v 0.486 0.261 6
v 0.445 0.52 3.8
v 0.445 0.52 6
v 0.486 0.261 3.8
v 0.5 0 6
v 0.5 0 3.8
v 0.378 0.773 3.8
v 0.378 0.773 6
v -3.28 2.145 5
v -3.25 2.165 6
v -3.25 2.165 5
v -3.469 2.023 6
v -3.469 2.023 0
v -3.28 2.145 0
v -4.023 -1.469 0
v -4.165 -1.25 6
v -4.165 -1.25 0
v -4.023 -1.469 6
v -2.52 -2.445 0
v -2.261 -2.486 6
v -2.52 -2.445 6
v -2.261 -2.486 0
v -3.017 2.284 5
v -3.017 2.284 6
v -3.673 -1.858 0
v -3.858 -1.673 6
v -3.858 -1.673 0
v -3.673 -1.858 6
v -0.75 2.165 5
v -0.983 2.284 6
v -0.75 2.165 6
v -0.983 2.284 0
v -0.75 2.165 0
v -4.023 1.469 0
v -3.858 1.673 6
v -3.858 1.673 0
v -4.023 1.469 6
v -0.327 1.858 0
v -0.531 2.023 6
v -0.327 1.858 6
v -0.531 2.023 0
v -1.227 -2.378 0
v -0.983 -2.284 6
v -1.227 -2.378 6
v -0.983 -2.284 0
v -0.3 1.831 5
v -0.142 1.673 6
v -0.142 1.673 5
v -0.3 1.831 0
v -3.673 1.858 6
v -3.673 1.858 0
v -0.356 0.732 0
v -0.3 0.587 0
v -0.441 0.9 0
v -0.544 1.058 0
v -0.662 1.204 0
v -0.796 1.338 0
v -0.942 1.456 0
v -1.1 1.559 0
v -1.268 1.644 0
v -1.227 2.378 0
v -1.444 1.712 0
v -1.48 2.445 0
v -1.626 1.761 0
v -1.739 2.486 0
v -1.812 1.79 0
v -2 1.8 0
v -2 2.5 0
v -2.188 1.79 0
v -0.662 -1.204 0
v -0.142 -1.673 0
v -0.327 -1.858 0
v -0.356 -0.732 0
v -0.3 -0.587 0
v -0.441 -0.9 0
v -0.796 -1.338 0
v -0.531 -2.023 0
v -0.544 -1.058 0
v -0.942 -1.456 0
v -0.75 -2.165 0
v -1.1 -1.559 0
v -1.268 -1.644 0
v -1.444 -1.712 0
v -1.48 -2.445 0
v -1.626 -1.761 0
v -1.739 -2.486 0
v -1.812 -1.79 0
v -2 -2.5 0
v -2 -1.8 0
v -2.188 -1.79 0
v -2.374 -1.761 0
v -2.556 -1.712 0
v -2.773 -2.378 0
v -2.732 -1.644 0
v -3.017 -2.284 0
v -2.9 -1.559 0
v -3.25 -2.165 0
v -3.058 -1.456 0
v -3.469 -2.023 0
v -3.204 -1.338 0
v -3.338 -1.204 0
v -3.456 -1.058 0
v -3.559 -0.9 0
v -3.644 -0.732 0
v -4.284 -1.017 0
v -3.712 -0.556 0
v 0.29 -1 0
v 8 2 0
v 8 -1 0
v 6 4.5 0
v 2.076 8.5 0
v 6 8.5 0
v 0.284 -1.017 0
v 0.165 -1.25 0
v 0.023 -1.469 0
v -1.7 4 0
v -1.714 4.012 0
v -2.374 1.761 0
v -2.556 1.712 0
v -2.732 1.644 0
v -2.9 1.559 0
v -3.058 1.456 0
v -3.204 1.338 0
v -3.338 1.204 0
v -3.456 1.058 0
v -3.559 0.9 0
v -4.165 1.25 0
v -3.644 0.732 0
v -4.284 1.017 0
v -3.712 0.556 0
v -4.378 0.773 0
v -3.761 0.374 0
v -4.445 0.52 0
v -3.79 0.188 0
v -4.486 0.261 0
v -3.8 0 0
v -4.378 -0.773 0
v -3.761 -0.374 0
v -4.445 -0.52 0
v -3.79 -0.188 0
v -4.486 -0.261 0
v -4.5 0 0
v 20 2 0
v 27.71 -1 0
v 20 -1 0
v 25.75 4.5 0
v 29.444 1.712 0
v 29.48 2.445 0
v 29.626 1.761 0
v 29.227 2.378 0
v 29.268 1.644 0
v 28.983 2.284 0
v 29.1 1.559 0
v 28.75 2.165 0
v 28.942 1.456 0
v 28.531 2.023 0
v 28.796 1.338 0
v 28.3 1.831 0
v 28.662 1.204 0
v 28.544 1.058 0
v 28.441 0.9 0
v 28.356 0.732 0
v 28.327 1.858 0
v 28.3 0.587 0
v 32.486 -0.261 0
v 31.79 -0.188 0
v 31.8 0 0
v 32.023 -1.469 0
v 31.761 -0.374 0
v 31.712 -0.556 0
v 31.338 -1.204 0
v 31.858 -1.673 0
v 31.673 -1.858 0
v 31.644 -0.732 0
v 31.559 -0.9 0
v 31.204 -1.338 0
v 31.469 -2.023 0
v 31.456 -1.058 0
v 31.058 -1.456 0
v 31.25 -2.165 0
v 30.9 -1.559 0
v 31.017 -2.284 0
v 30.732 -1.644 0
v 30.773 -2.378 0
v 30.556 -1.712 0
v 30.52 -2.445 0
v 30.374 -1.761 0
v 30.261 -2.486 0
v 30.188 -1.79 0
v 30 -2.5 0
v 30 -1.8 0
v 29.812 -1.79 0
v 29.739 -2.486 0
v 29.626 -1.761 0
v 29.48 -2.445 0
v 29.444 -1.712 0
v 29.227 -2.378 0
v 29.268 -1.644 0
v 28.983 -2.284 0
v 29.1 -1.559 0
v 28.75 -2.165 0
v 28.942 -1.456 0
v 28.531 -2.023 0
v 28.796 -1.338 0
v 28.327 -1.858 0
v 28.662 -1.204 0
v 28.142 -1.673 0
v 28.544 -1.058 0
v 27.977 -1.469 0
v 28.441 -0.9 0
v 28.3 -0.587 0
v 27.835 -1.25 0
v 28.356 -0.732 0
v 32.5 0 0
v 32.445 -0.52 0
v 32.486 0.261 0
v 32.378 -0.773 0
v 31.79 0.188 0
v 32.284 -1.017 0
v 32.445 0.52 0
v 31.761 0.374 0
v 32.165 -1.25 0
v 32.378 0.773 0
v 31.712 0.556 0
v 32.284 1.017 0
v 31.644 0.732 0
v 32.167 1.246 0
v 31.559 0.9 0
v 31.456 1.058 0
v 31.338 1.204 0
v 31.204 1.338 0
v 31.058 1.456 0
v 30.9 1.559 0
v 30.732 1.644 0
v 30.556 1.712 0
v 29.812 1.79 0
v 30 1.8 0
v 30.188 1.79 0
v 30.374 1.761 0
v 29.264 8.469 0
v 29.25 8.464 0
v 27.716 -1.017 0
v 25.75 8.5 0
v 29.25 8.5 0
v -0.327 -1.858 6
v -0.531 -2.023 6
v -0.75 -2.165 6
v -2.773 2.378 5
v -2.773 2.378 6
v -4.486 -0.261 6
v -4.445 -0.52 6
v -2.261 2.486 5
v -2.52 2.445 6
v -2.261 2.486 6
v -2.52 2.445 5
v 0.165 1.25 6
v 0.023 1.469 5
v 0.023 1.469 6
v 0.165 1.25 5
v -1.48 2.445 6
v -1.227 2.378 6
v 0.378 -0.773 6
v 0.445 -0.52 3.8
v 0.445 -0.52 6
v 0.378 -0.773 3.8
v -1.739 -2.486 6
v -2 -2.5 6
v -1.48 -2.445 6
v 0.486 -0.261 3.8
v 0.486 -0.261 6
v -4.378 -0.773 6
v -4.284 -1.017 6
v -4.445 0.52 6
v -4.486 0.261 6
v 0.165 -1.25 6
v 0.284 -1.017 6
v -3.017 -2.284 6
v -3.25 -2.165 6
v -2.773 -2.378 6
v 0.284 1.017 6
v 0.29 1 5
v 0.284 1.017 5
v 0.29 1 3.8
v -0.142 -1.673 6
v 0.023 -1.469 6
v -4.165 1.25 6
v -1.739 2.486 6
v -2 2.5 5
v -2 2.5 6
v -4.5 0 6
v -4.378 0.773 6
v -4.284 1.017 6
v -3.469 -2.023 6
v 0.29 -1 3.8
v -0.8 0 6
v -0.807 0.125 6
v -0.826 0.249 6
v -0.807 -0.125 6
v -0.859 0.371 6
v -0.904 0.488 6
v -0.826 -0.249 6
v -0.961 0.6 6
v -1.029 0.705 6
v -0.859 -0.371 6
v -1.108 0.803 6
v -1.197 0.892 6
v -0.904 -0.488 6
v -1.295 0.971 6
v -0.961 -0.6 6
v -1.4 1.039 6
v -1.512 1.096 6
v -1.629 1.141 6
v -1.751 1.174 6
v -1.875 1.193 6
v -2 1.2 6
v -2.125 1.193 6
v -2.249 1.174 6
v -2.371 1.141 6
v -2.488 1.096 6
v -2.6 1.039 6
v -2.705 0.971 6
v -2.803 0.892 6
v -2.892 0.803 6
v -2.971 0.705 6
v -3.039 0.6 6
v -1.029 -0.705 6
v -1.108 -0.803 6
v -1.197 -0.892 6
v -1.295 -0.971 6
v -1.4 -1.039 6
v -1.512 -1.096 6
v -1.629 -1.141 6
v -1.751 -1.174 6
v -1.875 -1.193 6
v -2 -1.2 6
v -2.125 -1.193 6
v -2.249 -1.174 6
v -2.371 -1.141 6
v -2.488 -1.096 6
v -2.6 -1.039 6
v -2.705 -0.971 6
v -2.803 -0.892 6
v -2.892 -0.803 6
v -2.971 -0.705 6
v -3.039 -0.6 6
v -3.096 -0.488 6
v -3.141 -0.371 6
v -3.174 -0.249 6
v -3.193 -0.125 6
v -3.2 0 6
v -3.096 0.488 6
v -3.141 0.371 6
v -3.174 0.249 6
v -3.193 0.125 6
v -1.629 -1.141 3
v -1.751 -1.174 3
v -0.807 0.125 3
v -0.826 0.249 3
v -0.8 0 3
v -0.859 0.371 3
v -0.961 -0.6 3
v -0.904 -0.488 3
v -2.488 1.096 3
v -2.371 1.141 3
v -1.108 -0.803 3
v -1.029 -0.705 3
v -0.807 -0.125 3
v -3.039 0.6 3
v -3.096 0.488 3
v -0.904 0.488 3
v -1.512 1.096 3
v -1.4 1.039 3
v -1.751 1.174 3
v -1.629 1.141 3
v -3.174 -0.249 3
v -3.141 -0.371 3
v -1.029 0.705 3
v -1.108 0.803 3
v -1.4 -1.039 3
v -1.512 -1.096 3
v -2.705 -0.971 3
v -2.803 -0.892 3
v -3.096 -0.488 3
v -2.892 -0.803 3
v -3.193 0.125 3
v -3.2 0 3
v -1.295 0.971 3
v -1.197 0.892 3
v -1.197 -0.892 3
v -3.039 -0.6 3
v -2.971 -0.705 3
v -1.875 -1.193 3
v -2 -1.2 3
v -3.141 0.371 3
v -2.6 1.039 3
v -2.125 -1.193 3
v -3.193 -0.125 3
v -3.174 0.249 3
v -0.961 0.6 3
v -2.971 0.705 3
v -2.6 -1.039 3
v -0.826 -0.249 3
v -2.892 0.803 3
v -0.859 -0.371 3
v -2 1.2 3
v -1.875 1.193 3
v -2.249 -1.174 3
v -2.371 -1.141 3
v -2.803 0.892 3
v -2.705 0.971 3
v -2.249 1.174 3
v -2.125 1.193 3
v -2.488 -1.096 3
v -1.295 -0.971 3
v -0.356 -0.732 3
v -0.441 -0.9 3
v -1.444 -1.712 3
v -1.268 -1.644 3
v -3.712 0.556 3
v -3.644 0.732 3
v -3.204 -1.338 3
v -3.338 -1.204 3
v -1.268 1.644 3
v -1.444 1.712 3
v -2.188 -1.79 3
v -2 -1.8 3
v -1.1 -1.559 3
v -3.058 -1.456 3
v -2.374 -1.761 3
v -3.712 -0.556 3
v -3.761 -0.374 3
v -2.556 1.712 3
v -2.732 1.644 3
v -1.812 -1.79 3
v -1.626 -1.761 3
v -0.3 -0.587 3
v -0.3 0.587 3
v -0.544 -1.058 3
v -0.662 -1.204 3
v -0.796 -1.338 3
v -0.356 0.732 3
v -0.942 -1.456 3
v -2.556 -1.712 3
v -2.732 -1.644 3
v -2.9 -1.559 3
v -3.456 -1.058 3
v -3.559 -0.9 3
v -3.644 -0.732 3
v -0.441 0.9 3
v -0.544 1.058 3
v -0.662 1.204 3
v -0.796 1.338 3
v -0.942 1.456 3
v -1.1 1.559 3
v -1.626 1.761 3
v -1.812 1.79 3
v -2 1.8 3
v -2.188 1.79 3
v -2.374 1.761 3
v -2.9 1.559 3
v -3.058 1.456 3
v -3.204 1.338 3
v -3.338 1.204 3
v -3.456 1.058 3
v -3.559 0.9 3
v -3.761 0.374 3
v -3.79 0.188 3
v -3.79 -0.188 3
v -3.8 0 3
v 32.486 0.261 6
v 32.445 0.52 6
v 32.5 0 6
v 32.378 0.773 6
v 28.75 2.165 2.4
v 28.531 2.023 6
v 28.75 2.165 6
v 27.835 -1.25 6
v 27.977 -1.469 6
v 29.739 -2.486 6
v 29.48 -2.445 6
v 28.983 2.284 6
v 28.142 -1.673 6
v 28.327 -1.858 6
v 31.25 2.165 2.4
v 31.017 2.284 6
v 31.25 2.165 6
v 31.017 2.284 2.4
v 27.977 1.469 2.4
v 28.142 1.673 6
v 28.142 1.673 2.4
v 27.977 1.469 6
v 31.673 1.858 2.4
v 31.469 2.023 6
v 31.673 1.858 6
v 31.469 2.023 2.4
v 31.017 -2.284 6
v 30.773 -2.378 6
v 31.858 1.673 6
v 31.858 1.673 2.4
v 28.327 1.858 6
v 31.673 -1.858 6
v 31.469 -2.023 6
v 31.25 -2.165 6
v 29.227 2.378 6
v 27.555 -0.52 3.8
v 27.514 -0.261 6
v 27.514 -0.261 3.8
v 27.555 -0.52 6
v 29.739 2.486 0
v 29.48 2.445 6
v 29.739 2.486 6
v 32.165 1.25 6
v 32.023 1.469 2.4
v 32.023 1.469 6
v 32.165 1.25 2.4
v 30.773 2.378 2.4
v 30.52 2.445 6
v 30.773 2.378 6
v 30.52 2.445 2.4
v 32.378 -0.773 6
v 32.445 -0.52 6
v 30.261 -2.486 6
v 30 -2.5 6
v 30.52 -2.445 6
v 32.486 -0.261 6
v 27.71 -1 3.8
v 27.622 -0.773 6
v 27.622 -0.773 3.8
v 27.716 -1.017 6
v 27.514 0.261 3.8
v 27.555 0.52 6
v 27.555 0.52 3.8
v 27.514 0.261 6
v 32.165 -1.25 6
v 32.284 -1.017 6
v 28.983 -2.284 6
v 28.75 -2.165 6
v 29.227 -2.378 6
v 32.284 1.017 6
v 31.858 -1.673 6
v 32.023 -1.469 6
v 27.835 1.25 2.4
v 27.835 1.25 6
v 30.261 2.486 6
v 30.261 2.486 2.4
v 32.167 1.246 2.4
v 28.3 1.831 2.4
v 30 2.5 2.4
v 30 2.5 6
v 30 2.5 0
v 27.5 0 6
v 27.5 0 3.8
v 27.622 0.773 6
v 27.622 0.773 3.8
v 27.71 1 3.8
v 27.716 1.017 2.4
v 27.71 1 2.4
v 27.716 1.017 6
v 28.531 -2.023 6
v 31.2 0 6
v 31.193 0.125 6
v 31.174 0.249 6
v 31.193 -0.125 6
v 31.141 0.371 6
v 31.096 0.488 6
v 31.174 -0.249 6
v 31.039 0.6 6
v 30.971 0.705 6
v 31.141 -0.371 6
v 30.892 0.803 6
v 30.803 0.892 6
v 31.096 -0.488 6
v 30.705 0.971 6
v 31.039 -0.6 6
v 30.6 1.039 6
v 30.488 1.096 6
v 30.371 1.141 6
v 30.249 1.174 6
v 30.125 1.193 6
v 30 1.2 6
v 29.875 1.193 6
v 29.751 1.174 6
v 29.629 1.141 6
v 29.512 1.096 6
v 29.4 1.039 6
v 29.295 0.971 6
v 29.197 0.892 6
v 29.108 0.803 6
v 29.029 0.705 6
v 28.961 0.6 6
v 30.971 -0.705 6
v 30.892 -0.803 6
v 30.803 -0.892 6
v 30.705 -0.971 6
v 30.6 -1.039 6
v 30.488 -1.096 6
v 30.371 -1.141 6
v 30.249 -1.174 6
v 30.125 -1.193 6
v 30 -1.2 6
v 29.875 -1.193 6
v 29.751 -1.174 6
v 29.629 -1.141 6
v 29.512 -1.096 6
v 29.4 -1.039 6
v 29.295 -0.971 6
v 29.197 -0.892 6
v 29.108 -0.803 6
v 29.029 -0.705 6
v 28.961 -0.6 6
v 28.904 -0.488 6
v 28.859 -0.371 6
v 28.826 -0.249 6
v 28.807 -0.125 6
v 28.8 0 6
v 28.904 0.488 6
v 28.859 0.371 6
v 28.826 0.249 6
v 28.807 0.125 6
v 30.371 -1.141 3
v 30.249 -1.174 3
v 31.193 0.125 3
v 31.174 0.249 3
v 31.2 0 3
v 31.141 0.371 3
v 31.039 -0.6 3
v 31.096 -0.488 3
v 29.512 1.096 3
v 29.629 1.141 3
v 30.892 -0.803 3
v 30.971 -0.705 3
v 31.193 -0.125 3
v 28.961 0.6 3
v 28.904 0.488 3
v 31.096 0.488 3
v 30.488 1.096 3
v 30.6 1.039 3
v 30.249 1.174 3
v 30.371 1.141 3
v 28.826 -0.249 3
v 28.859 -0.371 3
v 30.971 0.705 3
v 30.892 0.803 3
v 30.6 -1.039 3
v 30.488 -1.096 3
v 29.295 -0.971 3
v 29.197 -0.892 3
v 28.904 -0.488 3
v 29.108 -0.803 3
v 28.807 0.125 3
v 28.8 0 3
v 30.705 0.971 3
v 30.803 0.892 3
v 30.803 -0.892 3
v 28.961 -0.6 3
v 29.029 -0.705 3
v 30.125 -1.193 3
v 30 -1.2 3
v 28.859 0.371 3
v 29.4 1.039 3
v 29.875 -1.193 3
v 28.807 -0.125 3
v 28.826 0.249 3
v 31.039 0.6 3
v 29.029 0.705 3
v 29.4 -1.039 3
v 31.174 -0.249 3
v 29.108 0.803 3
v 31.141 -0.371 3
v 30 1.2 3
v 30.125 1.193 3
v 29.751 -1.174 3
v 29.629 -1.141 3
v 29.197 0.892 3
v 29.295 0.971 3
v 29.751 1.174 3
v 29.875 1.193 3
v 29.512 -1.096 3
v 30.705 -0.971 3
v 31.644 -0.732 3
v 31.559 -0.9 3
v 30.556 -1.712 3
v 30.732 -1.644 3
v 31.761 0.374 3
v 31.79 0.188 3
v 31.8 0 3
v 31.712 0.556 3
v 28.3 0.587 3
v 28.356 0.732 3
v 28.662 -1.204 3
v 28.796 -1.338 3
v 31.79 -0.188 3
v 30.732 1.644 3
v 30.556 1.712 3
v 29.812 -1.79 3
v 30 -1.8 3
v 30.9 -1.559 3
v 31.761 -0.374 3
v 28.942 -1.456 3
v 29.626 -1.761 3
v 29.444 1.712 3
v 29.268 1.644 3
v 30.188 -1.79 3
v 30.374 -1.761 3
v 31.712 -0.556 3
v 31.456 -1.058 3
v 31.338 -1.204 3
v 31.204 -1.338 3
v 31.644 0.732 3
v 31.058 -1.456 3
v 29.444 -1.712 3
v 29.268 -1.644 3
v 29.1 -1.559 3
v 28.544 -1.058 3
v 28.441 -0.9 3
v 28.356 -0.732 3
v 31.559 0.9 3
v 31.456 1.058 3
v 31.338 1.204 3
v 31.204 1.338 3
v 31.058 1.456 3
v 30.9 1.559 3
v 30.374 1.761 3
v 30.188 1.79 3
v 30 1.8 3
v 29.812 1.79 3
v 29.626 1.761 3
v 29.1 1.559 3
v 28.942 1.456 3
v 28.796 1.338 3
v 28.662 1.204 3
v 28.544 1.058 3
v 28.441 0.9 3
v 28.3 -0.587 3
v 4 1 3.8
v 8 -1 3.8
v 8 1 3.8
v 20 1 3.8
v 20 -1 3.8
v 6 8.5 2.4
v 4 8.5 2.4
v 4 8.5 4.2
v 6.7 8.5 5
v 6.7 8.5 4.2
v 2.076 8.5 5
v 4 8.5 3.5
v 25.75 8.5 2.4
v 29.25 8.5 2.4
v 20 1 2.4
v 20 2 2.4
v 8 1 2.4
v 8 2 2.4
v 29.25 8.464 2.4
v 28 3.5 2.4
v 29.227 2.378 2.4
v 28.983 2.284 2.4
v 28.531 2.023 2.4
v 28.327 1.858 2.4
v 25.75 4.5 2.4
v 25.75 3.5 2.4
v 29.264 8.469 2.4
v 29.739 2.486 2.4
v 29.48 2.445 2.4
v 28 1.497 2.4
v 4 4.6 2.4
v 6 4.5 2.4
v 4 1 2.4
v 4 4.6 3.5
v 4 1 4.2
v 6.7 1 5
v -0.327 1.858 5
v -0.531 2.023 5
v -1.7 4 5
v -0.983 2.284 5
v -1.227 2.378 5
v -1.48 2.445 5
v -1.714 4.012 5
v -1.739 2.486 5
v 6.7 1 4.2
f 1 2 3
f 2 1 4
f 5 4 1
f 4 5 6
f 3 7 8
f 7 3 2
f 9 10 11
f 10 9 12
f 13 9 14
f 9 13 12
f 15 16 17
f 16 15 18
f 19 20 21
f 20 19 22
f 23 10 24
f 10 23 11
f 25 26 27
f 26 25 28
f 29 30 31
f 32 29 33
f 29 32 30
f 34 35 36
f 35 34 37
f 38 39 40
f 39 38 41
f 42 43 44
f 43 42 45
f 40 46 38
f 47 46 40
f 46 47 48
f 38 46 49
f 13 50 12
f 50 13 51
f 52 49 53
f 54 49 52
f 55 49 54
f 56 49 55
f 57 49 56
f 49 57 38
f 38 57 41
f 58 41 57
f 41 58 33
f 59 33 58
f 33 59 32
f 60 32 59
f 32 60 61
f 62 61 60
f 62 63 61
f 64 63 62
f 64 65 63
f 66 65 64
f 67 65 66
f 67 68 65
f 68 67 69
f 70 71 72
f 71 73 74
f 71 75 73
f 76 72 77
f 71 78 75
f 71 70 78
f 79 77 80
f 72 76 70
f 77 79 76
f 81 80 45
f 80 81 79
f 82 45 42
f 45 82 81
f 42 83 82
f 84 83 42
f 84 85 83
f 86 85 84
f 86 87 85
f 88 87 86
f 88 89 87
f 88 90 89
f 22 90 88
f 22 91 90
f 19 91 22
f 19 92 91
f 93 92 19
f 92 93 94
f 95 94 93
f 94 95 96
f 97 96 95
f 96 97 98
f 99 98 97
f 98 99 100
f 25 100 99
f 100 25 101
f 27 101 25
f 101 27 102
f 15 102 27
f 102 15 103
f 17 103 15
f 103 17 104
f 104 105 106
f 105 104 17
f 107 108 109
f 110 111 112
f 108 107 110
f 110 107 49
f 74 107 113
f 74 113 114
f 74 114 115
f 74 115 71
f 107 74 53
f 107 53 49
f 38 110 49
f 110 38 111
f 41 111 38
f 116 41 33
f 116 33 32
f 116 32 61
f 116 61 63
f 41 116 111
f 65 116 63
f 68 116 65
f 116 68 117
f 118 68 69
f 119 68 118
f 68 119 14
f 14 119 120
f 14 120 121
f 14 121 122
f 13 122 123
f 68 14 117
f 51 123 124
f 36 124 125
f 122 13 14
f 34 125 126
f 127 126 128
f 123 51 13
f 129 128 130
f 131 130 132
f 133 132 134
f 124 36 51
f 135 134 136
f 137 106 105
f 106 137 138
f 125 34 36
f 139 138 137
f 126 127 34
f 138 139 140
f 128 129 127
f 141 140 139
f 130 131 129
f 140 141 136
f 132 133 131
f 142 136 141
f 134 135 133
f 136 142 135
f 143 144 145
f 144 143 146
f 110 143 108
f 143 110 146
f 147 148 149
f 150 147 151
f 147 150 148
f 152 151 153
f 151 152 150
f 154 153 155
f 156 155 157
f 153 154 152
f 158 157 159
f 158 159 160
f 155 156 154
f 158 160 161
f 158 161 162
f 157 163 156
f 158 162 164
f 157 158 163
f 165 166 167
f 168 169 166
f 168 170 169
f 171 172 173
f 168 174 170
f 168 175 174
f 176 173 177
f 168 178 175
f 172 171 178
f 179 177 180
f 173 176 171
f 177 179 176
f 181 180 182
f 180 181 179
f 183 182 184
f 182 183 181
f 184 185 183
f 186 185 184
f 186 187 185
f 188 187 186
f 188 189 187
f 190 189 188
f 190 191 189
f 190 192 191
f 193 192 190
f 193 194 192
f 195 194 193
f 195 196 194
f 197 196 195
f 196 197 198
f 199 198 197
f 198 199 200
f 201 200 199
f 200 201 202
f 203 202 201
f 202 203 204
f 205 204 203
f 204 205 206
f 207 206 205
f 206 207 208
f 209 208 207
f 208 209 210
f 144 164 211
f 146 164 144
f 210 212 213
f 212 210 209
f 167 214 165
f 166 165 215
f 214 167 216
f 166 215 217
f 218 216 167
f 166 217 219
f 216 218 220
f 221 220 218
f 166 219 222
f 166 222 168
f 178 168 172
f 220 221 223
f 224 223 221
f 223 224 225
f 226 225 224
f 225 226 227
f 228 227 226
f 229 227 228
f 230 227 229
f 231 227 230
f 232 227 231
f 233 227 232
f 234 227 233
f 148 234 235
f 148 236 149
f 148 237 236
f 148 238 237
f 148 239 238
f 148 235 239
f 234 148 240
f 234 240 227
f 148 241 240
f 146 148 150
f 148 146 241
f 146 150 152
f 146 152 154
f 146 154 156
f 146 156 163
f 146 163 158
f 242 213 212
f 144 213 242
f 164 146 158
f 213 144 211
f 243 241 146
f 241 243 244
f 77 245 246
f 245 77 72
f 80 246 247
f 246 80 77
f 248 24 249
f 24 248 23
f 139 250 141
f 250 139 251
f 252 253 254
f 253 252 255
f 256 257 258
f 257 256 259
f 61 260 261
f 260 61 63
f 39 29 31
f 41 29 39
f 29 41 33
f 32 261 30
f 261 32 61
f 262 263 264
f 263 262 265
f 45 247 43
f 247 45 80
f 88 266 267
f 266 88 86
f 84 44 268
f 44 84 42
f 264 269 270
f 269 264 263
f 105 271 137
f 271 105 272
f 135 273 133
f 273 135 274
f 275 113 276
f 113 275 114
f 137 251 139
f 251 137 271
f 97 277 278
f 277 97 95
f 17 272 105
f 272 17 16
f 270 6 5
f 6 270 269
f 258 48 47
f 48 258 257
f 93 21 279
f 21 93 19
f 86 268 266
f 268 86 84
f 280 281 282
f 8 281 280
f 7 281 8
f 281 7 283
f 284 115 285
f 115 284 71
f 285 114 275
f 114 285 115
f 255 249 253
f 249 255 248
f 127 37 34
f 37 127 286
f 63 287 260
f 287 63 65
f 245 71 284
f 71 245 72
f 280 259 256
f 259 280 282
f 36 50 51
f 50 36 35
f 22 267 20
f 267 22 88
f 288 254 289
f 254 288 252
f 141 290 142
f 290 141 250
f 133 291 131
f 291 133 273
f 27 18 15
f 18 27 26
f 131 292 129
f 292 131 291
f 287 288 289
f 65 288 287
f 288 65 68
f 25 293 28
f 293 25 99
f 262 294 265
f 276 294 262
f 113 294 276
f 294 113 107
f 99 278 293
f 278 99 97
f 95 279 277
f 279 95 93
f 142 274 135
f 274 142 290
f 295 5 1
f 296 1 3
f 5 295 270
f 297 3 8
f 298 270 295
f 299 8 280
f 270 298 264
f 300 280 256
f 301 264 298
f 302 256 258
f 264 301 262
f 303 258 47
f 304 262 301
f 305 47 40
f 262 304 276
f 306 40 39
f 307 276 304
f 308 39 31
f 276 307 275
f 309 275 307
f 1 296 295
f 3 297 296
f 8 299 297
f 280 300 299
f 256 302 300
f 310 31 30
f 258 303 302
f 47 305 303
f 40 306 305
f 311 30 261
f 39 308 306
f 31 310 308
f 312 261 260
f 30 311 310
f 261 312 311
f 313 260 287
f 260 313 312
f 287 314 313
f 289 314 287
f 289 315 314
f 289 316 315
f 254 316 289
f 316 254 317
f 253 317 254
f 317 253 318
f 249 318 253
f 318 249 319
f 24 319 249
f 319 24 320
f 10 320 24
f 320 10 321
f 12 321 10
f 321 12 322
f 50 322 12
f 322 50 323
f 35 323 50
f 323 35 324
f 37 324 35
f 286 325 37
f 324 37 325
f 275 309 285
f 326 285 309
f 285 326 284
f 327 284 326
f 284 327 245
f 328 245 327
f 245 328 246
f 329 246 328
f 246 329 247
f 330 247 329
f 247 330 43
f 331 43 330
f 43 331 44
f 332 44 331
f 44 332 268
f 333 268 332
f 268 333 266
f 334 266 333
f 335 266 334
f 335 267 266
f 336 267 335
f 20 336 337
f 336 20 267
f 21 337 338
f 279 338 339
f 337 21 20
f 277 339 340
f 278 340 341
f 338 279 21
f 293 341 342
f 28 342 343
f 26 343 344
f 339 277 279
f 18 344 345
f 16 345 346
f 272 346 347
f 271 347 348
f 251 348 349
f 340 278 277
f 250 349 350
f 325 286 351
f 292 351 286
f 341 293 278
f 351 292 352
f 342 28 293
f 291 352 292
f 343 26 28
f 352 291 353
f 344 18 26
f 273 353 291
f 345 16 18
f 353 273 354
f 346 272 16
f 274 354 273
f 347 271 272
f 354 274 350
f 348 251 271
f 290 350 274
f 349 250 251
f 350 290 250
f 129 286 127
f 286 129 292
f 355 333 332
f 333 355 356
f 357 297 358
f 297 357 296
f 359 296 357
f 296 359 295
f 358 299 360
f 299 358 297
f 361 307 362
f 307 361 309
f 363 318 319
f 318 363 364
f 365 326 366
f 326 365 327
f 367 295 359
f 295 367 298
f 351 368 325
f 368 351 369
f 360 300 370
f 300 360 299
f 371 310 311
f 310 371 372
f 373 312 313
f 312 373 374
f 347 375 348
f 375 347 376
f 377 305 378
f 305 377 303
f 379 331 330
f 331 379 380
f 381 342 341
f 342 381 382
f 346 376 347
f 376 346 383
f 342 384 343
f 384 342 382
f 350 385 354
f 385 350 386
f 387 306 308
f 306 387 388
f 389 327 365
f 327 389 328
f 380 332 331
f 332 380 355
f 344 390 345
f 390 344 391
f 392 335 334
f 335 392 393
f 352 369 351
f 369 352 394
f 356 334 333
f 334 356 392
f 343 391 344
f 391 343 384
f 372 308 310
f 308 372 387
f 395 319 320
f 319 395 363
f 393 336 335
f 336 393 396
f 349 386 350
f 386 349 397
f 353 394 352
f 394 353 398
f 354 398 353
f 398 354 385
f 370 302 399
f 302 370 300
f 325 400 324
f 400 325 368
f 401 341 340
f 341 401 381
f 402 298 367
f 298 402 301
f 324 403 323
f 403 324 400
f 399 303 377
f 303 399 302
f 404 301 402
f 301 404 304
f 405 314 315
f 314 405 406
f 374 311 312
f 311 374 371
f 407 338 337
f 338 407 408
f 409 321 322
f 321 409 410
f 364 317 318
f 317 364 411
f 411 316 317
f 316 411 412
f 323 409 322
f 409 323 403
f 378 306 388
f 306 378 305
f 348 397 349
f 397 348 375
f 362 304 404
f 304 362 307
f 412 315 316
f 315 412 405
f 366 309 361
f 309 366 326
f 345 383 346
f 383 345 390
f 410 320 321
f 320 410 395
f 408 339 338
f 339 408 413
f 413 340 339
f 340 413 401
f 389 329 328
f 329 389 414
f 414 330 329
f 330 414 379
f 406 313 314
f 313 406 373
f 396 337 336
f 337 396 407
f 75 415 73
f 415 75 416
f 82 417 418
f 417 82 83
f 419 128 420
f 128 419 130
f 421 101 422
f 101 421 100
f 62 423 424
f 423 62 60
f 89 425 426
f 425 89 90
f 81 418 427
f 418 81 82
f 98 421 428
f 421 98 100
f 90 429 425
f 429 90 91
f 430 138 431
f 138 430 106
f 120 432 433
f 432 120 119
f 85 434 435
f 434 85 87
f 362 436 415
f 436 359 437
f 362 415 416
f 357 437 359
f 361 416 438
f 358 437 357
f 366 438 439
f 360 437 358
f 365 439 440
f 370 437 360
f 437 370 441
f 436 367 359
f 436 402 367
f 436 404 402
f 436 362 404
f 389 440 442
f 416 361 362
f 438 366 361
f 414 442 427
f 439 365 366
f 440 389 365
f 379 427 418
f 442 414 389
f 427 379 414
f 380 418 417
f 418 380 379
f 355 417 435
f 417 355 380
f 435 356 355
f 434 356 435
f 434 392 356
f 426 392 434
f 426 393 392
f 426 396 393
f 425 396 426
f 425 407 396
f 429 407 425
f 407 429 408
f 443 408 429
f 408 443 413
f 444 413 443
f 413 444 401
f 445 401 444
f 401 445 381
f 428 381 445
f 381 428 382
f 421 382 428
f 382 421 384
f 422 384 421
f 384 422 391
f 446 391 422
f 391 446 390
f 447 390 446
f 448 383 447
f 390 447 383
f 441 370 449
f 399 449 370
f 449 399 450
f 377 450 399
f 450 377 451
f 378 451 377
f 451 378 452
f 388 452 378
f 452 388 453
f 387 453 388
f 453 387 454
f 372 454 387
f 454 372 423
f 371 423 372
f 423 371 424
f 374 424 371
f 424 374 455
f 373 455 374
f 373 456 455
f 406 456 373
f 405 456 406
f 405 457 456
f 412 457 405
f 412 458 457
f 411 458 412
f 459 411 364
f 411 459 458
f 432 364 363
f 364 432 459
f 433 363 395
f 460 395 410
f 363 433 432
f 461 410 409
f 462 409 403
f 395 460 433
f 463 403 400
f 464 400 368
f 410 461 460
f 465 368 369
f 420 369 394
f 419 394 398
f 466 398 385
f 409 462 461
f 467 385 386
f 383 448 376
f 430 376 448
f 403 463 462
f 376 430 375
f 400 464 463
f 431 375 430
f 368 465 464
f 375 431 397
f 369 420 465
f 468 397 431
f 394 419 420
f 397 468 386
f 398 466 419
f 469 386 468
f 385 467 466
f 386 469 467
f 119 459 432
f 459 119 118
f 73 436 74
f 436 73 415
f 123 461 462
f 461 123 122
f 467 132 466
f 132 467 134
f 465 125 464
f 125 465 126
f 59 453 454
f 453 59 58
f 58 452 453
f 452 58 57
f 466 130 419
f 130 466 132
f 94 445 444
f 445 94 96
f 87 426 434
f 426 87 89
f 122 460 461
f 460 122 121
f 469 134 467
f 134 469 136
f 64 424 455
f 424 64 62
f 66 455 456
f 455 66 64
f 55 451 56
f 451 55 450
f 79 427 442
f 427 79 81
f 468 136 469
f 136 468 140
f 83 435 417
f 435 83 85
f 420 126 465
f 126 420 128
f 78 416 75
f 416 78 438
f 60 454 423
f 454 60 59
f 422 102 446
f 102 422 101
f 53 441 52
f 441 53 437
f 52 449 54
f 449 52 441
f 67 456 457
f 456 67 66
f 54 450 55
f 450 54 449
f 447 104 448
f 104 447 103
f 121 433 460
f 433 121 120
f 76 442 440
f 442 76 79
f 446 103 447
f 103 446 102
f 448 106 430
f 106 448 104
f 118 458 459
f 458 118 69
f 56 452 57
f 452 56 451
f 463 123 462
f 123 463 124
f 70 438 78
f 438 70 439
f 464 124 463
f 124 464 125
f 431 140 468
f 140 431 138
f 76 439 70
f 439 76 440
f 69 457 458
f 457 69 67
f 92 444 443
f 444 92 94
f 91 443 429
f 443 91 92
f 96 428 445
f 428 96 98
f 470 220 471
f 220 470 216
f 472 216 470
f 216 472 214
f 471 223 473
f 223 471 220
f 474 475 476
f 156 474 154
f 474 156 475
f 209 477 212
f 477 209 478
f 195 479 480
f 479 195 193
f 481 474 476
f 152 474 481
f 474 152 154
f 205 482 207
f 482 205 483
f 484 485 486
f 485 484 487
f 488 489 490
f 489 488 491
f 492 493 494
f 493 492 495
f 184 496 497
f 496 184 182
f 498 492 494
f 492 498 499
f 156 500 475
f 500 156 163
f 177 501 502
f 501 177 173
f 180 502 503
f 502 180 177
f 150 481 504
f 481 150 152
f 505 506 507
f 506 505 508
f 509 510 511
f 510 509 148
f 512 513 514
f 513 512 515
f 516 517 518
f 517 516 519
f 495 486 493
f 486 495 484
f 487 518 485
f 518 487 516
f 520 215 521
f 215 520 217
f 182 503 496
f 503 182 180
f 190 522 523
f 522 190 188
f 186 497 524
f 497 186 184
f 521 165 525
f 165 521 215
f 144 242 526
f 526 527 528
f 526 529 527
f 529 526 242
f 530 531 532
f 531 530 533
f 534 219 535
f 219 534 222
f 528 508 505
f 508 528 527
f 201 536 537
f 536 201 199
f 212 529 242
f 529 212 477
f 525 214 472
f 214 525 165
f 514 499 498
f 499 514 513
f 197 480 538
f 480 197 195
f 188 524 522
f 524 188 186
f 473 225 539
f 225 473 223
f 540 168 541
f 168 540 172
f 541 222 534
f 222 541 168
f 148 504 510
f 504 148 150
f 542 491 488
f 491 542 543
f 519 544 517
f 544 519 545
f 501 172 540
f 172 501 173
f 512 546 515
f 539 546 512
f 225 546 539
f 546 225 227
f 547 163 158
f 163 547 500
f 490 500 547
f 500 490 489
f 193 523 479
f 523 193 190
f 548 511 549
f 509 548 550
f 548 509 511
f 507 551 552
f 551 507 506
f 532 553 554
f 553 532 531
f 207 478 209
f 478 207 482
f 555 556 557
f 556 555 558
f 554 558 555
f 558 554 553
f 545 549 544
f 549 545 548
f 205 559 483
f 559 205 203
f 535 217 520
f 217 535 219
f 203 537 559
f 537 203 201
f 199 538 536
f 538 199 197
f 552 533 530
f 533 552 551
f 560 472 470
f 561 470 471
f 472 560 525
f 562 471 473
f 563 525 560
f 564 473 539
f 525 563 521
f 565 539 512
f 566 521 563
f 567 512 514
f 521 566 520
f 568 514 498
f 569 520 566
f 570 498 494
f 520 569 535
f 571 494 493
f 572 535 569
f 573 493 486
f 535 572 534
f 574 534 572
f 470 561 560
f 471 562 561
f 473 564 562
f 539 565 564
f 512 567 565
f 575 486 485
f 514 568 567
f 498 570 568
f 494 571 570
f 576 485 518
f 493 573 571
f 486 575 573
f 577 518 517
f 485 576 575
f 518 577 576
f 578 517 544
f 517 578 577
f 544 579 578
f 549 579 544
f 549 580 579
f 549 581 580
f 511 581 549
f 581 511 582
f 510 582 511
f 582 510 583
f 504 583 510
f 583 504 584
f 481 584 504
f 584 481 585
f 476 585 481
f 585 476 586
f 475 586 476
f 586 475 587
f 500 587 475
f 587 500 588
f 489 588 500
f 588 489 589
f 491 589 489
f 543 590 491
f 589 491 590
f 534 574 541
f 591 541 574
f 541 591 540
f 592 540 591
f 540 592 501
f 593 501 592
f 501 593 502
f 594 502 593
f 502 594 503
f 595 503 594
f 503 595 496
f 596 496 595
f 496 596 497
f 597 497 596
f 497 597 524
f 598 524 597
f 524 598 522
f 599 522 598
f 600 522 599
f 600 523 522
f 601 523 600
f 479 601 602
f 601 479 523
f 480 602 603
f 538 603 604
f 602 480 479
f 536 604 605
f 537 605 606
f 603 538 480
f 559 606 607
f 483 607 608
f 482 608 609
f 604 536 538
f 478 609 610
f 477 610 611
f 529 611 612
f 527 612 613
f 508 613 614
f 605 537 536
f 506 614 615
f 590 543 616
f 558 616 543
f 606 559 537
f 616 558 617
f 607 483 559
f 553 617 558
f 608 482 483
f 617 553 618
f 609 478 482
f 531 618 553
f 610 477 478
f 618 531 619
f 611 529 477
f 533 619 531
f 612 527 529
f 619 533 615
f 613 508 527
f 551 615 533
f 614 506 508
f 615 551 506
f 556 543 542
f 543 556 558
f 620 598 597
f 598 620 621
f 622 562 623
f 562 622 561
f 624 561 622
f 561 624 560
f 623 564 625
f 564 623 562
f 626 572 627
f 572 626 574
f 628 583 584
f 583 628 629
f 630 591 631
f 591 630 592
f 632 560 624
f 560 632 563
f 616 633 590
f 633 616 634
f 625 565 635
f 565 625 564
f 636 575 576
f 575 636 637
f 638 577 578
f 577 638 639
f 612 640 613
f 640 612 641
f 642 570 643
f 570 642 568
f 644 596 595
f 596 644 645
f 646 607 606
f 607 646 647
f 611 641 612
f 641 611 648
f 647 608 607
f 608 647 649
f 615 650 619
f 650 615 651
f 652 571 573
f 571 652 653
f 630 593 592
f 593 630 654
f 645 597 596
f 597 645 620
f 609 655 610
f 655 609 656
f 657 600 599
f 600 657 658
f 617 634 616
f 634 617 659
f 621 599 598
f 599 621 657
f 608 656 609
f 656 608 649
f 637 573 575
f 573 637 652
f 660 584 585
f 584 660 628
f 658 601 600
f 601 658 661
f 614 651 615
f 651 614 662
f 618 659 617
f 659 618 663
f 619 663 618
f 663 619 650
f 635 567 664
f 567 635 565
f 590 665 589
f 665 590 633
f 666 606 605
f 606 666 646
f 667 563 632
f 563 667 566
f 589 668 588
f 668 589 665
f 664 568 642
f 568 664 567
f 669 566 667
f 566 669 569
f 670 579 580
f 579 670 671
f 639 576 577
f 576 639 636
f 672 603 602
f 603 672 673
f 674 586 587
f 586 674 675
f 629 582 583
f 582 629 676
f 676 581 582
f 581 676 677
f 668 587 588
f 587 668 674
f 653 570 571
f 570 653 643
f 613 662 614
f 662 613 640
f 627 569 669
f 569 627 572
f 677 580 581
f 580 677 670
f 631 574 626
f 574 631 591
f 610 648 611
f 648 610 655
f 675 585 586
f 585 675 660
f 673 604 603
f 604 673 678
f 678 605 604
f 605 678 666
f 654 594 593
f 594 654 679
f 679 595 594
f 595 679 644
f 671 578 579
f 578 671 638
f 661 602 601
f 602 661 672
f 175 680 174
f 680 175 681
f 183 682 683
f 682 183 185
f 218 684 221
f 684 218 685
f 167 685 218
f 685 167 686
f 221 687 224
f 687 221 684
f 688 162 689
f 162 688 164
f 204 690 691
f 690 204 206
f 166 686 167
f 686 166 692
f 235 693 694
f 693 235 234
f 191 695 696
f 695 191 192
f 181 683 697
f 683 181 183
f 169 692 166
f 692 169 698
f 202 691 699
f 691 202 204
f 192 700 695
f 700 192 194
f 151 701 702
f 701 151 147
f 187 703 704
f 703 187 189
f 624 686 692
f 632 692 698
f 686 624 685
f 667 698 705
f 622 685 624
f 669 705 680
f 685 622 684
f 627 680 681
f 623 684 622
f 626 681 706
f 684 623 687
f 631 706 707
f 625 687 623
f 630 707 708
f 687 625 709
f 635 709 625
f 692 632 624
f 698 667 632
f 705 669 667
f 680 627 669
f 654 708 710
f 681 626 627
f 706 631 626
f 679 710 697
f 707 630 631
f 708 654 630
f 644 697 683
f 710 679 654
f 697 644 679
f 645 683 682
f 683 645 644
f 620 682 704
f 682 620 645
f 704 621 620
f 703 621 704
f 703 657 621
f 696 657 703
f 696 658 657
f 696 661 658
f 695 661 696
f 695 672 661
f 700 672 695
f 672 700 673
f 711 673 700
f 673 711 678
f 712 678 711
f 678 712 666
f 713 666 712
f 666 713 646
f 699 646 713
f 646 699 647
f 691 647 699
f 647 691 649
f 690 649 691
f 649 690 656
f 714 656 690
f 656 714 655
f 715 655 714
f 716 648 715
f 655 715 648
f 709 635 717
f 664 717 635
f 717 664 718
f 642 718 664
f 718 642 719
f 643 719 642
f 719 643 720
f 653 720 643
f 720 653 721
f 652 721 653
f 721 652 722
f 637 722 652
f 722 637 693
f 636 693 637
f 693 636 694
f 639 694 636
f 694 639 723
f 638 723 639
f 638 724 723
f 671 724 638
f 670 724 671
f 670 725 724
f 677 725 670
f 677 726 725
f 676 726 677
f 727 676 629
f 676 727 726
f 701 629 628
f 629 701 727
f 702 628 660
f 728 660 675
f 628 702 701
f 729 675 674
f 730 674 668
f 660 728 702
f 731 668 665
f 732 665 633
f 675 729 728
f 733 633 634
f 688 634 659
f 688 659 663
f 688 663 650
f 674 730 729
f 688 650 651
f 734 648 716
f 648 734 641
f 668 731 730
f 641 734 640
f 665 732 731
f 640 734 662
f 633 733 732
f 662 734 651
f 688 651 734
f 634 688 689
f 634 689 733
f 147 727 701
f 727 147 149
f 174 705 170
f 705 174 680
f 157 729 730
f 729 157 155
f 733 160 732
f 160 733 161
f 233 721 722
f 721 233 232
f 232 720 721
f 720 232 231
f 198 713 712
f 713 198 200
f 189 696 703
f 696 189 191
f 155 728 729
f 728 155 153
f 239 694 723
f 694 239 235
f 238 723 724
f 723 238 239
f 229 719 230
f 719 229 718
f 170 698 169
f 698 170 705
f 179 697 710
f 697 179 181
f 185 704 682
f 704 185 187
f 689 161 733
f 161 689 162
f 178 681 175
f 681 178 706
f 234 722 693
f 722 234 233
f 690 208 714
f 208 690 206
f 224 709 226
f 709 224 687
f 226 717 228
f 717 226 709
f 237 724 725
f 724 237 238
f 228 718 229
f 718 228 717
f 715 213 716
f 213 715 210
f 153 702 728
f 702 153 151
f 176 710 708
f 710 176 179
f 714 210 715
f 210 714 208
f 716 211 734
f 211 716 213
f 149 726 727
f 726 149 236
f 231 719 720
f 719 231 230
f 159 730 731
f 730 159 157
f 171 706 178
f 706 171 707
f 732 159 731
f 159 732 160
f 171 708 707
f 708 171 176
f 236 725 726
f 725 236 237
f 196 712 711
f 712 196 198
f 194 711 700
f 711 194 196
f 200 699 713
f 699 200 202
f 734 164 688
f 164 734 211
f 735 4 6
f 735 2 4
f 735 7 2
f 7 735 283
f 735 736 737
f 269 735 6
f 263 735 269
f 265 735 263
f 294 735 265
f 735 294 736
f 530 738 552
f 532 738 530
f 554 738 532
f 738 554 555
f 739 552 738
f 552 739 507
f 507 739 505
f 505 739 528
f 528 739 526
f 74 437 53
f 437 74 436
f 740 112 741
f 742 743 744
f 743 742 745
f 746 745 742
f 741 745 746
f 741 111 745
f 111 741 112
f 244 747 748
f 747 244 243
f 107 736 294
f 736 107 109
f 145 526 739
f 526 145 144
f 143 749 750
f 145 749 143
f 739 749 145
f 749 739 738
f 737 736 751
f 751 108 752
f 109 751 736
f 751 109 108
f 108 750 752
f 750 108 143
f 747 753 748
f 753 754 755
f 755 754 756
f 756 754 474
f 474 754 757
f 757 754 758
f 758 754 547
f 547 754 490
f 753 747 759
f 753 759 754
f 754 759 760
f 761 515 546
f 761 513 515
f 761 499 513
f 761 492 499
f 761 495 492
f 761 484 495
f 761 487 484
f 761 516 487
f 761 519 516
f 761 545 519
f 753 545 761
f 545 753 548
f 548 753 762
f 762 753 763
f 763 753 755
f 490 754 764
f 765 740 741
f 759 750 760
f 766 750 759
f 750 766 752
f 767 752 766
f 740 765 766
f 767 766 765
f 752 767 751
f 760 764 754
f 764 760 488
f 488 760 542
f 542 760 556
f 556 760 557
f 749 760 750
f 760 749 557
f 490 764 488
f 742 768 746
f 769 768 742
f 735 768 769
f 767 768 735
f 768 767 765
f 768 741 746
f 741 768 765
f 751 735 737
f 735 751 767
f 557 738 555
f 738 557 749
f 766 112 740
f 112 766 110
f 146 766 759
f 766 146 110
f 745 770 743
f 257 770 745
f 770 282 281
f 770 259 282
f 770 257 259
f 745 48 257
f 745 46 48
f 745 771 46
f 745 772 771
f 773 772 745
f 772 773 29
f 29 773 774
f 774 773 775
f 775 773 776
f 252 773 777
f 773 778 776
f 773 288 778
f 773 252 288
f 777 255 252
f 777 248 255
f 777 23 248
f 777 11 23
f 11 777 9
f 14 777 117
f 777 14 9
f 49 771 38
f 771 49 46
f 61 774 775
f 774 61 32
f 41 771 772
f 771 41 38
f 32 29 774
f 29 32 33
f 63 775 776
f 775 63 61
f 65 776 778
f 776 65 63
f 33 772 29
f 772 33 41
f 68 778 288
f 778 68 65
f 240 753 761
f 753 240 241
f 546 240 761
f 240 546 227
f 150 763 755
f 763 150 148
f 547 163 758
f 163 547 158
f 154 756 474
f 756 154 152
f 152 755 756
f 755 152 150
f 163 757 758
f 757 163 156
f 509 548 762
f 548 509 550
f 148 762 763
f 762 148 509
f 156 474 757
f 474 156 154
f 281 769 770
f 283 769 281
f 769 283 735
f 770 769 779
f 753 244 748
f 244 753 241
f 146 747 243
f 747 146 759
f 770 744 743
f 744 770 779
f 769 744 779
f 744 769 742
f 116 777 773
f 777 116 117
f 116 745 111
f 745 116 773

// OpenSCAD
$fn = 60;

interface_handle = true;

// 31mm

difference() {
    mount();
    translate([-1.7, 4, -2]) rotate([0, 0, 50]) cube([14, 10, 10]);
}

//#translate([0, 8.5, -5]) cube([100, 1, 20]);

module mount() {

    translate([-2, 0, 0]) mountHole();
    
    translate([28 + 2, 0, 0]) mountHole();
    
    difference() {
        translate([-0.3, -1, 0]) cube([28 + 0.6, interface_handle ? 9.5 : 6.6, 3.8]);
        translate([8, -2, -0.1]) cube([12, 4, 4]);
        translate([4, 1, 2.4]) cube([25, interface_handle ? 9 : 4, 2]);
        if (!interface_handle) {
            translate([4, 1, 2]) rotate([-25, 0, 0]) cube([25, 4, 2]);
        } else {
            translate([6, 4.5, -0.5]) cube([21.5, 5, 4]);
        }
    }
    
    // left mount of interface
    translate([-0.3, 1, 1.5]) cube([4.3, 3.6, 3.5]);
    translate([25.75, 3.5, 0]) cube([3.5, 5, 2.4]);
    
    // right mount of the interface
    translate([-0.3, 1, 4.2]) cube([7, 7.5, 0.8]);
    translate([-0.3, 4, 3.5]) cube([4.3, 4.5, 1]);
    
    // Edges
    difference() {
        translate([-1.5, -0.4, 0]) rotate([0, 0, 50]) cube([6.2, 3, 5]);
        translate([-2, 0, -0.5]) cylinder(d = 5, h = 6);
    }
    difference() {
        translate([28, 0, 0]) {
            translate([-2, 2.4, 0]) rotate([0, 0, -40]) cube([4.2, 3, 2.4]);
            translate([-1.52, 7.35, 0]) rotate([0, 0, -68.1]) cube([8, 3, 2.4]);
        }
        
        translate([28 + 2, 0, -0.5]) cylinder(d = 5, h = 6);
        if (!interface_handle) {
            translate([8, 1, 2]) rotate([-25, 0, 0]) cube([25, 5, 10]);
            translate([28 - 3, 0, 2.4]) cube([10, 4, 4]);
        } else {
            translate([28 - 3, 1, 2.4]) cube([3, 4, 4]);
        }
    }
}

module mountHole() {
    difference() {
        cylinder(d = 5, h = 6);
        translate([0, 0, -0.5]) cylinder(d = 2.4, h = 7);
        translate([0, 0, -0.5]) cylinder(d = 3.6, h = 3.5);
    }
}
